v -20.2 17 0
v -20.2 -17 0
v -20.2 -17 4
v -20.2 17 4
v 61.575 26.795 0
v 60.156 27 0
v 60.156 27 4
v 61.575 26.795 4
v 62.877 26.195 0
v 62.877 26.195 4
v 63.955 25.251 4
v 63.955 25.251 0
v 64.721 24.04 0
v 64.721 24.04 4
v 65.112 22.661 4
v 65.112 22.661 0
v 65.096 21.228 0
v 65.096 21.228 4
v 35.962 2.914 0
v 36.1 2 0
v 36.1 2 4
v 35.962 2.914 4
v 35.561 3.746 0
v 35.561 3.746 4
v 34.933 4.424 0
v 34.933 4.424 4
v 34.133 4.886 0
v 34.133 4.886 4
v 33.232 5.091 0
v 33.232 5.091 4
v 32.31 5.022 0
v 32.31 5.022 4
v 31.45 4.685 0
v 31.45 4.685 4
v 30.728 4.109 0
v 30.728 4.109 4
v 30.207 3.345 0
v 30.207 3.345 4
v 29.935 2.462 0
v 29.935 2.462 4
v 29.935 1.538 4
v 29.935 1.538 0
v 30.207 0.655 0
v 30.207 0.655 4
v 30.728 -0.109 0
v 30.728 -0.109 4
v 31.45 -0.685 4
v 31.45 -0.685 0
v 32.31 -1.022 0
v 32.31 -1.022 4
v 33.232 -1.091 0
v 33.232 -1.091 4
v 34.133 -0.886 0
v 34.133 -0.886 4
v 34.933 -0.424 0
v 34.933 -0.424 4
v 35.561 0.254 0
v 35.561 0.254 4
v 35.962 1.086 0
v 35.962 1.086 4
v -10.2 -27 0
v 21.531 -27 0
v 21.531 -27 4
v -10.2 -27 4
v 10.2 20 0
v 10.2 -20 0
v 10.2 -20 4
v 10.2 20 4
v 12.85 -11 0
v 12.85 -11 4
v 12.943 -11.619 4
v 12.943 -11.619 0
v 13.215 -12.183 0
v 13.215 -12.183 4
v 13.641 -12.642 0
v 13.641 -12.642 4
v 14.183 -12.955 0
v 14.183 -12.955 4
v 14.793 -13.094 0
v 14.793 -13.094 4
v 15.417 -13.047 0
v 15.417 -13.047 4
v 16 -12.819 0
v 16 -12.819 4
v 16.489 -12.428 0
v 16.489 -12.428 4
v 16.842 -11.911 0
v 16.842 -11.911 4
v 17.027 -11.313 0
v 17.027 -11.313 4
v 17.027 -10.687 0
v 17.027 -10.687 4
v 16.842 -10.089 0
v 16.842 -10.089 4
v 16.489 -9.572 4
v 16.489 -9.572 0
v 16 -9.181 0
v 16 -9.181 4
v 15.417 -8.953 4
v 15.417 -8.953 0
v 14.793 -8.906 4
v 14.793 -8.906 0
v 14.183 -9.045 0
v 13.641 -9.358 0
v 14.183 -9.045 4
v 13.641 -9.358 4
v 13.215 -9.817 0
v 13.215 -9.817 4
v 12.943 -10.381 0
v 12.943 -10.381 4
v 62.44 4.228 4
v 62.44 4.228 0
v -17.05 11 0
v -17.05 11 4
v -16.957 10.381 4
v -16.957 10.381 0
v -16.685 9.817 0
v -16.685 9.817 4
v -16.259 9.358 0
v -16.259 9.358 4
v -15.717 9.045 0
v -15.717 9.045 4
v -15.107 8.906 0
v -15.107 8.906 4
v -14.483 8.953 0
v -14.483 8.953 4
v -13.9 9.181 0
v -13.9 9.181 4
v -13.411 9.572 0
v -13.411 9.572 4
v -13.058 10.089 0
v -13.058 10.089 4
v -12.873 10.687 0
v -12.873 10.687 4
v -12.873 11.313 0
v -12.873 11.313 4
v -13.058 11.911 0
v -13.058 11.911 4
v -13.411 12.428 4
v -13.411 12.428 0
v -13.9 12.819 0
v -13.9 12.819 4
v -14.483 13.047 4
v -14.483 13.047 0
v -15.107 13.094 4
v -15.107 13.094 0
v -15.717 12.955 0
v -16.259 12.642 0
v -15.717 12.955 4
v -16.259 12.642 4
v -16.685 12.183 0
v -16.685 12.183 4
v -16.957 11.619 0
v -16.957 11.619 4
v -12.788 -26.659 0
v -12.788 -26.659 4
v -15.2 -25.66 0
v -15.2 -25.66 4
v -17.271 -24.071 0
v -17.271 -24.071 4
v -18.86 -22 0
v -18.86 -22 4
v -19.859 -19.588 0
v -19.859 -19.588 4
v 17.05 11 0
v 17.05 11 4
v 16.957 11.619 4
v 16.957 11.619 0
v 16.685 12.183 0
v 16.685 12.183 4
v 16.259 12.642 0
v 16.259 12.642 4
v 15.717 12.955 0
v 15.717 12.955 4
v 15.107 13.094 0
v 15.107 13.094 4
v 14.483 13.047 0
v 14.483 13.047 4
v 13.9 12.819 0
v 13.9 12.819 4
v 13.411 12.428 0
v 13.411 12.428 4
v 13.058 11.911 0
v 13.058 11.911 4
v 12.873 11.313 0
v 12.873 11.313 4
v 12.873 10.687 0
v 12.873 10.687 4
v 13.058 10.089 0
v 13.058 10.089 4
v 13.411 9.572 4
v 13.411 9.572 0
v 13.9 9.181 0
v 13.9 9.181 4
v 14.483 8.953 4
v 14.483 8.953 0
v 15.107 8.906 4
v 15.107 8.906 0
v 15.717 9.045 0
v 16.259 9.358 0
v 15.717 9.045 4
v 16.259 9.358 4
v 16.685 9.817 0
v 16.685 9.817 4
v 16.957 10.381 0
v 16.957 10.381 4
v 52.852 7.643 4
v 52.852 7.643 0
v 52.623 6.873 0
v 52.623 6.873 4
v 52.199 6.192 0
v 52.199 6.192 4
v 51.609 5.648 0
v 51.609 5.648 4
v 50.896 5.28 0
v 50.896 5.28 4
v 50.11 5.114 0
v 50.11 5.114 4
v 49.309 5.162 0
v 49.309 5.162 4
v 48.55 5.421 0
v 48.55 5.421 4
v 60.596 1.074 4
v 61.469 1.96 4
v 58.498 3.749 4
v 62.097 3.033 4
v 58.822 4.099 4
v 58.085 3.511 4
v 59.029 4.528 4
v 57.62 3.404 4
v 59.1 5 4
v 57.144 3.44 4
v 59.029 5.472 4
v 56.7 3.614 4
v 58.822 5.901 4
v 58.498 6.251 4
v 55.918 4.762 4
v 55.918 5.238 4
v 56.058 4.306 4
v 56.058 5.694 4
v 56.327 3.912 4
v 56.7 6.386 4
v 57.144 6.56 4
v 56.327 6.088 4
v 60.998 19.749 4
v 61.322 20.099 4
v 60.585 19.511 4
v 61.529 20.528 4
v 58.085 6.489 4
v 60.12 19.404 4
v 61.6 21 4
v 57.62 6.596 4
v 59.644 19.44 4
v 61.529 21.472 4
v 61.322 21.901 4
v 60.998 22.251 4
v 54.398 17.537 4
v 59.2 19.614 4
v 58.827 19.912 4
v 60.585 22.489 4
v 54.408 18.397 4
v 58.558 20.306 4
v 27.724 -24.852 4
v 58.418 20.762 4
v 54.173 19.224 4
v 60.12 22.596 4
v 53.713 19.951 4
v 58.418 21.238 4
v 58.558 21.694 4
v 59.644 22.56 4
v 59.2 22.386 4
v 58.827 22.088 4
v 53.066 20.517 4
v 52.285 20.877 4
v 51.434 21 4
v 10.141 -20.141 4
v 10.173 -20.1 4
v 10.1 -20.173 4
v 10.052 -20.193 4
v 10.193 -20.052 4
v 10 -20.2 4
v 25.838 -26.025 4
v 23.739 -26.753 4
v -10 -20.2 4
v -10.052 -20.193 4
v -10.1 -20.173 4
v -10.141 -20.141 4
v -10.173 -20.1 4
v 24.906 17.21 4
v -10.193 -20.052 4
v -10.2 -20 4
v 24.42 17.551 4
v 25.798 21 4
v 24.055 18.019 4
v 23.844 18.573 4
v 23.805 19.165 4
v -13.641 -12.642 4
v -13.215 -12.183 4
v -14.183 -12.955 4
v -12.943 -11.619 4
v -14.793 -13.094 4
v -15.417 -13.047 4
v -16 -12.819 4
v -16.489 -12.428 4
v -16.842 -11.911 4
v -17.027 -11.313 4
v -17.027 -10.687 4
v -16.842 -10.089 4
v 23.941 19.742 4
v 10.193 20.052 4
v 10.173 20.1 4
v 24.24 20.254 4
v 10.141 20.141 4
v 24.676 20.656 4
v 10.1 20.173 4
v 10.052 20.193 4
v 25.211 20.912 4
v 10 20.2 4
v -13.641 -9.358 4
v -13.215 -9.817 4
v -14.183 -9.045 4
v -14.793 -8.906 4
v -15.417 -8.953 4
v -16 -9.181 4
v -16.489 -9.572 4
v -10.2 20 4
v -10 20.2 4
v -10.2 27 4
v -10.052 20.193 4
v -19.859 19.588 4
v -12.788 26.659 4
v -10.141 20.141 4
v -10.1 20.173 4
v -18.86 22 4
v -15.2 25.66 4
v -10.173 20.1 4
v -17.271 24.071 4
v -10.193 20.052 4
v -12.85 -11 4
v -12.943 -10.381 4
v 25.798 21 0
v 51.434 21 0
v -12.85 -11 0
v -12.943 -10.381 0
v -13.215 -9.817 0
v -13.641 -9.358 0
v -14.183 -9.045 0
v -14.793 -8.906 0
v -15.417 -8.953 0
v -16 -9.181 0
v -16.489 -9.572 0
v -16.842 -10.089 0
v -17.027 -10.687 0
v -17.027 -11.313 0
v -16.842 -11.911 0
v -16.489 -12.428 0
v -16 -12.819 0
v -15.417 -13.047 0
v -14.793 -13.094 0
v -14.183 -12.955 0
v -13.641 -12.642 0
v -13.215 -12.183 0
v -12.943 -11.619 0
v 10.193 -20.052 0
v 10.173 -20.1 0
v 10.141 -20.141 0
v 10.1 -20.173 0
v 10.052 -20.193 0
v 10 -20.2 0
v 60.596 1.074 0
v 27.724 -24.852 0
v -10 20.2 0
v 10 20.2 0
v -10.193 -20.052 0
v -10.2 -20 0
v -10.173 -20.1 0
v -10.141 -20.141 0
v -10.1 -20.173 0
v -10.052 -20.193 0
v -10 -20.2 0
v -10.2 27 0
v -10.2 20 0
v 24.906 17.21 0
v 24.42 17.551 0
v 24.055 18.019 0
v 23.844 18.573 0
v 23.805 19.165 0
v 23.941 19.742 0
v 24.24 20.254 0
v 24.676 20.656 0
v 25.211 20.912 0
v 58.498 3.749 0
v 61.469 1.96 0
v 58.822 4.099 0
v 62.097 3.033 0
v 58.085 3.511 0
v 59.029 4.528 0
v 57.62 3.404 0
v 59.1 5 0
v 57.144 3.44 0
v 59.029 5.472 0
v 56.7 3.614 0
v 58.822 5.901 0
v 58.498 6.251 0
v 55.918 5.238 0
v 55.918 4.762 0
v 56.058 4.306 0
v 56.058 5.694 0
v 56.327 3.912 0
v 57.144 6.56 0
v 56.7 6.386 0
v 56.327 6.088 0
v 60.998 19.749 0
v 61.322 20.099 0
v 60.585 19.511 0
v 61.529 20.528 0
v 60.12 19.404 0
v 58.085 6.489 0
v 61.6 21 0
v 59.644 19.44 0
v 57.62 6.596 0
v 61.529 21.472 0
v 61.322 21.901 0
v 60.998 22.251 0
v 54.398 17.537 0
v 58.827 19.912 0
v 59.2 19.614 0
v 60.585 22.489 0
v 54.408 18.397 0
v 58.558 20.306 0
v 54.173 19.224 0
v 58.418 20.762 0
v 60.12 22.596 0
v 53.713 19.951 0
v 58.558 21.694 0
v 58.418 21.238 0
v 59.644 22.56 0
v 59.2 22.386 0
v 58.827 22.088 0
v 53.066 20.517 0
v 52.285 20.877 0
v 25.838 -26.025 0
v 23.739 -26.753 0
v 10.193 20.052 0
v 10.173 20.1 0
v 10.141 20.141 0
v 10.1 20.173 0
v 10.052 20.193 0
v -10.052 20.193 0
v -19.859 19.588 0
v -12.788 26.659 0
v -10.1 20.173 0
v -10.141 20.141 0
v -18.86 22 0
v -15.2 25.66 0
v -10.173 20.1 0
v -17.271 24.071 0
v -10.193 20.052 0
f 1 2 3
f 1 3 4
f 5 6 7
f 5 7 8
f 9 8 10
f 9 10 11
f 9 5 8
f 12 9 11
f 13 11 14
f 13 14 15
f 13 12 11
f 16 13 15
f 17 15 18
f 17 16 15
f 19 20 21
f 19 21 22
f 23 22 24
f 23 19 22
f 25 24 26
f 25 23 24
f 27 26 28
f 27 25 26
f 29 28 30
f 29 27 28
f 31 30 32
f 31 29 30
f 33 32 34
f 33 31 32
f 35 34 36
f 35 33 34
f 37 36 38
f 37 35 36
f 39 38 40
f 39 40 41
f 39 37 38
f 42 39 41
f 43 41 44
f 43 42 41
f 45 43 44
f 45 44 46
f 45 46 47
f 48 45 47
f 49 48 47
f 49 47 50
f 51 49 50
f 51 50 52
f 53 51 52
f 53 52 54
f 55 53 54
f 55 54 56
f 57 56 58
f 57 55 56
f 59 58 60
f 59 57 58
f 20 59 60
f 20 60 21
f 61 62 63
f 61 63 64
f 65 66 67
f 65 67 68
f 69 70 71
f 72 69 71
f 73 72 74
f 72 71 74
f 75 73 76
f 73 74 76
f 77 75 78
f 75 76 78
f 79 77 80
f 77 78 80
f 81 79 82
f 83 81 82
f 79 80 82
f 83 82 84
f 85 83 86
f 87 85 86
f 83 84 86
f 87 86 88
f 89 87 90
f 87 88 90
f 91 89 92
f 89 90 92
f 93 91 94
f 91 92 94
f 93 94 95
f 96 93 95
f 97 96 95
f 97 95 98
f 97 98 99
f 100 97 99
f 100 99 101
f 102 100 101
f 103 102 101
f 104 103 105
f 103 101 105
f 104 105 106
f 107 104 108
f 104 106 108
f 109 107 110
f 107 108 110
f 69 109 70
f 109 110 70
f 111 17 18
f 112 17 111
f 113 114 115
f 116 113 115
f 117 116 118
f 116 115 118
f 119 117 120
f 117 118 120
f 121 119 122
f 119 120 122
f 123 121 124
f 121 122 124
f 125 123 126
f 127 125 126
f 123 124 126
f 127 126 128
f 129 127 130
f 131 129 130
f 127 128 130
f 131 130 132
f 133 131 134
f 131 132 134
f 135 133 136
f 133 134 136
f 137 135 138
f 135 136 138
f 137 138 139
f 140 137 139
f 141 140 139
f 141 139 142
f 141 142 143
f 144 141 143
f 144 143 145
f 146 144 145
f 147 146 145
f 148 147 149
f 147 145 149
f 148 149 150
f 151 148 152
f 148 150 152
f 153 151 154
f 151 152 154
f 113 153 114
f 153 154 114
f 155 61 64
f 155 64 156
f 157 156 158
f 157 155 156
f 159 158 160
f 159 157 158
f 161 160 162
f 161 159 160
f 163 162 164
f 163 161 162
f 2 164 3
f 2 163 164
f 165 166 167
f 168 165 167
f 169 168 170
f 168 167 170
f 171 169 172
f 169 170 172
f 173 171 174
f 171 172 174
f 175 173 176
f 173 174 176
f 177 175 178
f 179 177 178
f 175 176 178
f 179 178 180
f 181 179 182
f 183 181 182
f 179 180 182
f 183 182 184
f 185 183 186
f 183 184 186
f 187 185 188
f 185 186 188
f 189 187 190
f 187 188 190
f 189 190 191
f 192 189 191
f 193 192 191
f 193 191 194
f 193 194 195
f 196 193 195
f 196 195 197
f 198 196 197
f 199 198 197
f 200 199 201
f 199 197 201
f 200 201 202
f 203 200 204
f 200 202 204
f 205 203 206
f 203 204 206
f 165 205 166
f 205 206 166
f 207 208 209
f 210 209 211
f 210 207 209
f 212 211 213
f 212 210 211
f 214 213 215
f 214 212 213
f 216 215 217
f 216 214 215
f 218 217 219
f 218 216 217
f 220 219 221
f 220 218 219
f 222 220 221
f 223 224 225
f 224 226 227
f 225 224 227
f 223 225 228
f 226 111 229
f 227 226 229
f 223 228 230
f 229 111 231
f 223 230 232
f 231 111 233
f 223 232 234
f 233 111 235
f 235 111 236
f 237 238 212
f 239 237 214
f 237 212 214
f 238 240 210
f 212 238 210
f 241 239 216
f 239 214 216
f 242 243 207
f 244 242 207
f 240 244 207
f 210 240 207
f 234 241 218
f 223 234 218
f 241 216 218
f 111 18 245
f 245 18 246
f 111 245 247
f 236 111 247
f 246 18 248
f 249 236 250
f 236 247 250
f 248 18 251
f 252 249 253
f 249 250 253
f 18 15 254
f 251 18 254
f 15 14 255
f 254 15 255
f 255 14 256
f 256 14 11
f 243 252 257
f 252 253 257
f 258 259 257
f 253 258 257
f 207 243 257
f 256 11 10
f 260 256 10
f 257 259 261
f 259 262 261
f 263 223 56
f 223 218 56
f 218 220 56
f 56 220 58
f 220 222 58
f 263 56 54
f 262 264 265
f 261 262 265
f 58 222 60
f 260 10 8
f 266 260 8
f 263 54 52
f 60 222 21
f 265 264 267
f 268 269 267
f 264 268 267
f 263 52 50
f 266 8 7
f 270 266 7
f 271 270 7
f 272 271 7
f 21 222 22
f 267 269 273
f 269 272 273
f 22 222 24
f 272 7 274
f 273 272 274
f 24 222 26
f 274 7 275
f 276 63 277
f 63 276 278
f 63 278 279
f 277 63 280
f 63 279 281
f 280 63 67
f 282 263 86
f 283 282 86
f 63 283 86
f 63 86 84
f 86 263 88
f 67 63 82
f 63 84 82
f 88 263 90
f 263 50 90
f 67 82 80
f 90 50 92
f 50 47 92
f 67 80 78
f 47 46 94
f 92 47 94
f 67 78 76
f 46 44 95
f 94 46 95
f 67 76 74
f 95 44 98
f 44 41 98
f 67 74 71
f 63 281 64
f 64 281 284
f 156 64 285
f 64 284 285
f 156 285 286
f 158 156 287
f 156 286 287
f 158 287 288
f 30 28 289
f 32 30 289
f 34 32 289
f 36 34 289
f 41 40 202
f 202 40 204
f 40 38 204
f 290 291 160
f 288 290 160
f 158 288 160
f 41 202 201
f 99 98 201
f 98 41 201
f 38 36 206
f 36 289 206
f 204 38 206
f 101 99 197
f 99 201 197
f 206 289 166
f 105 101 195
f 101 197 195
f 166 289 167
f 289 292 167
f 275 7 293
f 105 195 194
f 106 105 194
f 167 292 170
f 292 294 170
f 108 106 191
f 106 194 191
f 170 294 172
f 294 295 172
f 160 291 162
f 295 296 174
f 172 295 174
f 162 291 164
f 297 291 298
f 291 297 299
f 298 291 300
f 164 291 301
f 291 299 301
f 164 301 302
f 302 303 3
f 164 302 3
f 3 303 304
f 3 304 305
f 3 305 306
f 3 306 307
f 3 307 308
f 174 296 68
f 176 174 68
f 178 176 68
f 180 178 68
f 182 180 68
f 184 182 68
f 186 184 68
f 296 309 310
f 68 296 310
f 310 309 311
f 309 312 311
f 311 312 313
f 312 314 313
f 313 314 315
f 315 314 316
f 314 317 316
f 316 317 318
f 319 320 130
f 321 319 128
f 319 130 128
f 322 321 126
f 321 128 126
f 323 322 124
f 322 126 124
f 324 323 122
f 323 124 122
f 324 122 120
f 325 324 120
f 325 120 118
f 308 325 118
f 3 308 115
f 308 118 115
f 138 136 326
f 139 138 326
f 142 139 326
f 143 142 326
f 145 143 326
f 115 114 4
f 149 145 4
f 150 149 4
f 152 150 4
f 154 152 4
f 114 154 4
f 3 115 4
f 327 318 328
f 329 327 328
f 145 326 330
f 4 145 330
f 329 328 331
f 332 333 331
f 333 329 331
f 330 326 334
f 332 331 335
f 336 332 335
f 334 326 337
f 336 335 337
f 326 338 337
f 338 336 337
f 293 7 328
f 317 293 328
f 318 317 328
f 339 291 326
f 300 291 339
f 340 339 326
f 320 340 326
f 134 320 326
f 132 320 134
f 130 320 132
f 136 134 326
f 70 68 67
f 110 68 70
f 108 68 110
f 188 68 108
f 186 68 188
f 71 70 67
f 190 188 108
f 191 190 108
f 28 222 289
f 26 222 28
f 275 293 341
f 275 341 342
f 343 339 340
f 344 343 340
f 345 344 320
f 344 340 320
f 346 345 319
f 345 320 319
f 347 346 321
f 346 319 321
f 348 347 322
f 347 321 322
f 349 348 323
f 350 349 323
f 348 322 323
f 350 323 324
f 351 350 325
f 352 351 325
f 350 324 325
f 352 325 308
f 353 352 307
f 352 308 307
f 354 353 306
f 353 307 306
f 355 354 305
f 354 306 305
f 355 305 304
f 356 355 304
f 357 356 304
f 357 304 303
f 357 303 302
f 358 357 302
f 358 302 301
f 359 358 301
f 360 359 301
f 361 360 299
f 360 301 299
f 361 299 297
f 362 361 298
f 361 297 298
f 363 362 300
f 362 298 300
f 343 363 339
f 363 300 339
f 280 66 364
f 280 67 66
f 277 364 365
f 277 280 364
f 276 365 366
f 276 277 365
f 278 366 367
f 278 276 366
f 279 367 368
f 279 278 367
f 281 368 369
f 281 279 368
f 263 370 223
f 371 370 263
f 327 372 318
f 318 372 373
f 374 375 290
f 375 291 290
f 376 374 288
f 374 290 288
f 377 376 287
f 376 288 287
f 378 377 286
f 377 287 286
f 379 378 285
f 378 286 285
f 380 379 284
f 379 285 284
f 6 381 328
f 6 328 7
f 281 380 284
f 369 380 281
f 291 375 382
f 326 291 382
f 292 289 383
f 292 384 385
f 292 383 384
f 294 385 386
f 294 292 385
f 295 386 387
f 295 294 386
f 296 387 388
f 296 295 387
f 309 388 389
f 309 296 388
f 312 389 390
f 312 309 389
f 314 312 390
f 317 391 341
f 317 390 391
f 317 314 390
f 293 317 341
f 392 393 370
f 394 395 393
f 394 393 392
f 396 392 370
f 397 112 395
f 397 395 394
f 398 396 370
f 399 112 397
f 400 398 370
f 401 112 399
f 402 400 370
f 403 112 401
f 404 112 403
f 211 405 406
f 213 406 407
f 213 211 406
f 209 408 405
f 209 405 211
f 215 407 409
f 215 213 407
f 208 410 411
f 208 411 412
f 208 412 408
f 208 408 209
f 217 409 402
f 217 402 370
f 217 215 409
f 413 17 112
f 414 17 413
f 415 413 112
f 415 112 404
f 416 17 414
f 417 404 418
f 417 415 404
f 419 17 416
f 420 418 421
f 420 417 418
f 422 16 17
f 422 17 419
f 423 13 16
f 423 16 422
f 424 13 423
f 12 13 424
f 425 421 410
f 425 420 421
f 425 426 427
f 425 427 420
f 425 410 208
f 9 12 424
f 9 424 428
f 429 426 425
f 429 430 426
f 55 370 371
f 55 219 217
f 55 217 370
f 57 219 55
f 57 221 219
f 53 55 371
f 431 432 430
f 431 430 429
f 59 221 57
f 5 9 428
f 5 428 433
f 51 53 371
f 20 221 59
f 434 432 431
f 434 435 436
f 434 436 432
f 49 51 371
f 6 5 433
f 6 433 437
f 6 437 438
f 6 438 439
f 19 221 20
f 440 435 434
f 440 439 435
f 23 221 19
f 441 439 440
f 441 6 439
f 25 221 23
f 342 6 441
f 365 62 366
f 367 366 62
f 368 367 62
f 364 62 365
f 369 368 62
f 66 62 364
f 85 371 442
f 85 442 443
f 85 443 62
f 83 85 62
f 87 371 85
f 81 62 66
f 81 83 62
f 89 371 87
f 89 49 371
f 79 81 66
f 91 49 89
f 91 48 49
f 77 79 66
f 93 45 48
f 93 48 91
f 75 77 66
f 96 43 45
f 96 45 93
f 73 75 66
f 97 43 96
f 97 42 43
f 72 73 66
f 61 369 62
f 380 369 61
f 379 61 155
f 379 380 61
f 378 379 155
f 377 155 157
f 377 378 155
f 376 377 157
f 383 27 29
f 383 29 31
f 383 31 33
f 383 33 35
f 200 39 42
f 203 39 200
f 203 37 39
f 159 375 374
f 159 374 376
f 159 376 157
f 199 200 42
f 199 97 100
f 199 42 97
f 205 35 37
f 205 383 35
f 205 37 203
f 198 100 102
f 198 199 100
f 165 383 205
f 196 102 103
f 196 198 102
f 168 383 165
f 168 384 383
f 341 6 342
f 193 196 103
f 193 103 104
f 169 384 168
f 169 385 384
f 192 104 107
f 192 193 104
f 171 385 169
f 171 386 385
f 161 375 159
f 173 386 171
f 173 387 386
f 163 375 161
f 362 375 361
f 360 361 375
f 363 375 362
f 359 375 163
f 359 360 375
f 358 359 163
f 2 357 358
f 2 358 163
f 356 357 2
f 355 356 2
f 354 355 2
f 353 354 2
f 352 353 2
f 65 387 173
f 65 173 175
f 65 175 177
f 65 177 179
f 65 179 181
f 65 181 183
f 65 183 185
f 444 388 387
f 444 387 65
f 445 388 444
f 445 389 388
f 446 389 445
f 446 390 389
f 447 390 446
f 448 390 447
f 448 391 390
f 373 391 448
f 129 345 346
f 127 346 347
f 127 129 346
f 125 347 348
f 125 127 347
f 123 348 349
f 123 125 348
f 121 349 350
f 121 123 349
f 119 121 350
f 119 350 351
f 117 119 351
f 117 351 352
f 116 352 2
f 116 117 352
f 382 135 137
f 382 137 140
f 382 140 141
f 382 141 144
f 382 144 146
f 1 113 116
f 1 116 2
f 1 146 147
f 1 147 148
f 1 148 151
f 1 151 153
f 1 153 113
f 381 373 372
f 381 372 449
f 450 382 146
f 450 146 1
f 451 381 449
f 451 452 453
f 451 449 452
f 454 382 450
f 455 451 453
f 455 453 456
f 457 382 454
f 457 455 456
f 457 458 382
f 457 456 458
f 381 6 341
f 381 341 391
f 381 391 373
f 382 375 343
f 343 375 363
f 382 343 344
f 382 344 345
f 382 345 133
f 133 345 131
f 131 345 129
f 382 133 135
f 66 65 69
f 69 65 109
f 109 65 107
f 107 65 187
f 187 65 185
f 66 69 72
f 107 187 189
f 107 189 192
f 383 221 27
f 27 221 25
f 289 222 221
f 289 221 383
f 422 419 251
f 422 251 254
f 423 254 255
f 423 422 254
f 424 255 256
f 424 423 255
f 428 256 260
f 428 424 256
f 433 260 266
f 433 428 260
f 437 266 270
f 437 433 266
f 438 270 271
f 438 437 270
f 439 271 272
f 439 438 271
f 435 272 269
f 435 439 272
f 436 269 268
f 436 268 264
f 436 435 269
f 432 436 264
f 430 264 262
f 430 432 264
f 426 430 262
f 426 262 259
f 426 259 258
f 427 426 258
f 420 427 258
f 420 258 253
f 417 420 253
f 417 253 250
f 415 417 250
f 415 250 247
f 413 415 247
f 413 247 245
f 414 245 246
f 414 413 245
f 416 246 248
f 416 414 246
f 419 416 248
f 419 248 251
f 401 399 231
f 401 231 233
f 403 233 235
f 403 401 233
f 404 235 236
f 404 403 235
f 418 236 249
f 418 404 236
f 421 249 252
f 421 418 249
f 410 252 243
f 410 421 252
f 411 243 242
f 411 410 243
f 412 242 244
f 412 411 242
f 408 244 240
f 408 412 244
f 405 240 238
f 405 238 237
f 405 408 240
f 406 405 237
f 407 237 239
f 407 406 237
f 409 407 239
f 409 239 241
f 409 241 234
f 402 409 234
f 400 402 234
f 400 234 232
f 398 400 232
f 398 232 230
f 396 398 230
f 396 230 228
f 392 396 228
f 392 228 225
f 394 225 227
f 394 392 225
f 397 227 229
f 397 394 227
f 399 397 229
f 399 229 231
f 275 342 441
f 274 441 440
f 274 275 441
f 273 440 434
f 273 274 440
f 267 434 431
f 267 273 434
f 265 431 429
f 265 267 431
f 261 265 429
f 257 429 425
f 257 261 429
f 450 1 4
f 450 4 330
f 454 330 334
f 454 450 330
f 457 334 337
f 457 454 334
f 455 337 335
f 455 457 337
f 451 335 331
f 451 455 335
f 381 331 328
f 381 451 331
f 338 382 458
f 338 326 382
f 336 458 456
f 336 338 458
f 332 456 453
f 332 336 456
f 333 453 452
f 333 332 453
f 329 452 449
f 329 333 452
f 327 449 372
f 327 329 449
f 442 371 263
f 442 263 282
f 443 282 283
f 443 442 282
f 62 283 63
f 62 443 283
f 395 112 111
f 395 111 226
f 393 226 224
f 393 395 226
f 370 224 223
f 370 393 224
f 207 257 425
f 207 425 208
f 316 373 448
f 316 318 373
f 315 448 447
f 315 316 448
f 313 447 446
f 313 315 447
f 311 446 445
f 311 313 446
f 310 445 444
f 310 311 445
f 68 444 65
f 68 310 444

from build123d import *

# Parameters (mm, degrees)
SKETCH_1_R          = 3.1
SKETCH_1_R_2        = 1.6
SKETCH_1_W          = 20.4
SKETCH_1_H          = 40.4
EXTRUDE_1_DEPTH     = 4
FILLET_1_R          = 0.2
SKETCH_2_R          = 2.1
CUT_EXTRUDE_1_DEPTH = 4
CUT_EXTRUDE_2_DEPTH = 10


with BuildPart() as part:
    # 草图1 → 凸台-拉伸1 (new body)
    with BuildSketch(Plane.XY):
        with BuildLine():
            Line((-10.2, 27), (60.15625, 27))
            ThreePointArc((60.15625, 27), (63.954895943, 25.251198086), (65.096310169, 21.228115599))
            Line((65.096310169, 21.228115599), (62.440060169, 4.228115599))
            ThreePointArc((62.440060169, 4.228115599), (61.816569536, 2.476663431), (60.596300169, 1.074070141))
            Line((60.596300169, 1.074070141), (27.72371786, -24.851859719))
            ThreePointArc((27.72371786, -24.851859719), (24.808418455, -26.447713935), (21.531117522, -27))
            Line((21.531117522, -27), (-10.2, -27))
            ThreePointArc((-10.2, -27), (-17.271067812, -24.071067812), (-20.2, -17))
            Line((-20.2, -17), (-20.2, 17))
            ThreePointArc((-20.2, 17), (-17.271067812, 24.071067812), (-10.2, 27))
        make_face()
        with Locations((33, 2)):
            Circle(SKETCH_1_R, mode=Mode.SUBTRACT)
        with Locations((60, 21)):
            Circle(SKETCH_1_R_2, mode=Mode.SUBTRACT)
        with Locations((57.5, 5)):
            Circle(SKETCH_1_R_2, mode=Mode.SUBTRACT)
        Rectangle(SKETCH_1_W, SKETCH_1_H, mode=Mode.SUBTRACT)
    extrude(amount=EXTRUDE_1_DEPTH)

    # 圆角1
    fillet_1_edges = [part.edges().sort_by_distance(p)[0] for p in [
        (-10.2, 20.2, 2),
        (-10.2, -20.2, 2),
        (10.2, -20.2, 2),
        (10.2, 20.2, 2),
    ]]
    fillet(fillet_1_edges, radius=FILLET_1_R)

    # 草图2 → 切除-拉伸1 (cut)
    with BuildSketch(Plane.XY.offset(4)):
        with Locations((14.95, 11)):
            Circle(SKETCH_2_R)
        with Locations(Location((14.95, -11, 0), (0, 0, 180))):
            Circle(SKETCH_2_R)
        with Locations((-14.95, -11)):
            Circle(SKETCH_2_R)
        with Locations(Location((-14.95, 11, 0), (0, 0, 180))):
            Circle(SKETCH_2_R)
    extrude(amount=-CUT_EXTRUDE_1_DEPTH, mode=Mode.SUBTRACT)

    # 草图3 → 切除-拉伸2 (cut)
    with BuildSketch(Plane.XY.offset(4)):
        with BuildLine():
            Line((25.798016292, 21), (51.43418263, 21))
            ThreePointArc((51.43418263, 21), (53.713370196, 19.950718852), (54.398218731, 17.536869359))
            Line((54.398218731, 17.536869359), (52.852232934, 7.642560256))
            ThreePointArc((52.852232934, 7.642560256), (51.264559821, 5.440053089), (48.549531682, 5.420923567))
            Line((48.549531682, 5.420923567), (24.905572858, 17.210155114))
            ThreePointArc((24.905572858, 17.210155114), (23.851263897, 19.458426781), (25.798016292, 21))
        make_face()
    extrude(amount=-CUT_EXTRUDE_2_DEPTH, mode=Mode.SUBTRACT)


solid = part.part
